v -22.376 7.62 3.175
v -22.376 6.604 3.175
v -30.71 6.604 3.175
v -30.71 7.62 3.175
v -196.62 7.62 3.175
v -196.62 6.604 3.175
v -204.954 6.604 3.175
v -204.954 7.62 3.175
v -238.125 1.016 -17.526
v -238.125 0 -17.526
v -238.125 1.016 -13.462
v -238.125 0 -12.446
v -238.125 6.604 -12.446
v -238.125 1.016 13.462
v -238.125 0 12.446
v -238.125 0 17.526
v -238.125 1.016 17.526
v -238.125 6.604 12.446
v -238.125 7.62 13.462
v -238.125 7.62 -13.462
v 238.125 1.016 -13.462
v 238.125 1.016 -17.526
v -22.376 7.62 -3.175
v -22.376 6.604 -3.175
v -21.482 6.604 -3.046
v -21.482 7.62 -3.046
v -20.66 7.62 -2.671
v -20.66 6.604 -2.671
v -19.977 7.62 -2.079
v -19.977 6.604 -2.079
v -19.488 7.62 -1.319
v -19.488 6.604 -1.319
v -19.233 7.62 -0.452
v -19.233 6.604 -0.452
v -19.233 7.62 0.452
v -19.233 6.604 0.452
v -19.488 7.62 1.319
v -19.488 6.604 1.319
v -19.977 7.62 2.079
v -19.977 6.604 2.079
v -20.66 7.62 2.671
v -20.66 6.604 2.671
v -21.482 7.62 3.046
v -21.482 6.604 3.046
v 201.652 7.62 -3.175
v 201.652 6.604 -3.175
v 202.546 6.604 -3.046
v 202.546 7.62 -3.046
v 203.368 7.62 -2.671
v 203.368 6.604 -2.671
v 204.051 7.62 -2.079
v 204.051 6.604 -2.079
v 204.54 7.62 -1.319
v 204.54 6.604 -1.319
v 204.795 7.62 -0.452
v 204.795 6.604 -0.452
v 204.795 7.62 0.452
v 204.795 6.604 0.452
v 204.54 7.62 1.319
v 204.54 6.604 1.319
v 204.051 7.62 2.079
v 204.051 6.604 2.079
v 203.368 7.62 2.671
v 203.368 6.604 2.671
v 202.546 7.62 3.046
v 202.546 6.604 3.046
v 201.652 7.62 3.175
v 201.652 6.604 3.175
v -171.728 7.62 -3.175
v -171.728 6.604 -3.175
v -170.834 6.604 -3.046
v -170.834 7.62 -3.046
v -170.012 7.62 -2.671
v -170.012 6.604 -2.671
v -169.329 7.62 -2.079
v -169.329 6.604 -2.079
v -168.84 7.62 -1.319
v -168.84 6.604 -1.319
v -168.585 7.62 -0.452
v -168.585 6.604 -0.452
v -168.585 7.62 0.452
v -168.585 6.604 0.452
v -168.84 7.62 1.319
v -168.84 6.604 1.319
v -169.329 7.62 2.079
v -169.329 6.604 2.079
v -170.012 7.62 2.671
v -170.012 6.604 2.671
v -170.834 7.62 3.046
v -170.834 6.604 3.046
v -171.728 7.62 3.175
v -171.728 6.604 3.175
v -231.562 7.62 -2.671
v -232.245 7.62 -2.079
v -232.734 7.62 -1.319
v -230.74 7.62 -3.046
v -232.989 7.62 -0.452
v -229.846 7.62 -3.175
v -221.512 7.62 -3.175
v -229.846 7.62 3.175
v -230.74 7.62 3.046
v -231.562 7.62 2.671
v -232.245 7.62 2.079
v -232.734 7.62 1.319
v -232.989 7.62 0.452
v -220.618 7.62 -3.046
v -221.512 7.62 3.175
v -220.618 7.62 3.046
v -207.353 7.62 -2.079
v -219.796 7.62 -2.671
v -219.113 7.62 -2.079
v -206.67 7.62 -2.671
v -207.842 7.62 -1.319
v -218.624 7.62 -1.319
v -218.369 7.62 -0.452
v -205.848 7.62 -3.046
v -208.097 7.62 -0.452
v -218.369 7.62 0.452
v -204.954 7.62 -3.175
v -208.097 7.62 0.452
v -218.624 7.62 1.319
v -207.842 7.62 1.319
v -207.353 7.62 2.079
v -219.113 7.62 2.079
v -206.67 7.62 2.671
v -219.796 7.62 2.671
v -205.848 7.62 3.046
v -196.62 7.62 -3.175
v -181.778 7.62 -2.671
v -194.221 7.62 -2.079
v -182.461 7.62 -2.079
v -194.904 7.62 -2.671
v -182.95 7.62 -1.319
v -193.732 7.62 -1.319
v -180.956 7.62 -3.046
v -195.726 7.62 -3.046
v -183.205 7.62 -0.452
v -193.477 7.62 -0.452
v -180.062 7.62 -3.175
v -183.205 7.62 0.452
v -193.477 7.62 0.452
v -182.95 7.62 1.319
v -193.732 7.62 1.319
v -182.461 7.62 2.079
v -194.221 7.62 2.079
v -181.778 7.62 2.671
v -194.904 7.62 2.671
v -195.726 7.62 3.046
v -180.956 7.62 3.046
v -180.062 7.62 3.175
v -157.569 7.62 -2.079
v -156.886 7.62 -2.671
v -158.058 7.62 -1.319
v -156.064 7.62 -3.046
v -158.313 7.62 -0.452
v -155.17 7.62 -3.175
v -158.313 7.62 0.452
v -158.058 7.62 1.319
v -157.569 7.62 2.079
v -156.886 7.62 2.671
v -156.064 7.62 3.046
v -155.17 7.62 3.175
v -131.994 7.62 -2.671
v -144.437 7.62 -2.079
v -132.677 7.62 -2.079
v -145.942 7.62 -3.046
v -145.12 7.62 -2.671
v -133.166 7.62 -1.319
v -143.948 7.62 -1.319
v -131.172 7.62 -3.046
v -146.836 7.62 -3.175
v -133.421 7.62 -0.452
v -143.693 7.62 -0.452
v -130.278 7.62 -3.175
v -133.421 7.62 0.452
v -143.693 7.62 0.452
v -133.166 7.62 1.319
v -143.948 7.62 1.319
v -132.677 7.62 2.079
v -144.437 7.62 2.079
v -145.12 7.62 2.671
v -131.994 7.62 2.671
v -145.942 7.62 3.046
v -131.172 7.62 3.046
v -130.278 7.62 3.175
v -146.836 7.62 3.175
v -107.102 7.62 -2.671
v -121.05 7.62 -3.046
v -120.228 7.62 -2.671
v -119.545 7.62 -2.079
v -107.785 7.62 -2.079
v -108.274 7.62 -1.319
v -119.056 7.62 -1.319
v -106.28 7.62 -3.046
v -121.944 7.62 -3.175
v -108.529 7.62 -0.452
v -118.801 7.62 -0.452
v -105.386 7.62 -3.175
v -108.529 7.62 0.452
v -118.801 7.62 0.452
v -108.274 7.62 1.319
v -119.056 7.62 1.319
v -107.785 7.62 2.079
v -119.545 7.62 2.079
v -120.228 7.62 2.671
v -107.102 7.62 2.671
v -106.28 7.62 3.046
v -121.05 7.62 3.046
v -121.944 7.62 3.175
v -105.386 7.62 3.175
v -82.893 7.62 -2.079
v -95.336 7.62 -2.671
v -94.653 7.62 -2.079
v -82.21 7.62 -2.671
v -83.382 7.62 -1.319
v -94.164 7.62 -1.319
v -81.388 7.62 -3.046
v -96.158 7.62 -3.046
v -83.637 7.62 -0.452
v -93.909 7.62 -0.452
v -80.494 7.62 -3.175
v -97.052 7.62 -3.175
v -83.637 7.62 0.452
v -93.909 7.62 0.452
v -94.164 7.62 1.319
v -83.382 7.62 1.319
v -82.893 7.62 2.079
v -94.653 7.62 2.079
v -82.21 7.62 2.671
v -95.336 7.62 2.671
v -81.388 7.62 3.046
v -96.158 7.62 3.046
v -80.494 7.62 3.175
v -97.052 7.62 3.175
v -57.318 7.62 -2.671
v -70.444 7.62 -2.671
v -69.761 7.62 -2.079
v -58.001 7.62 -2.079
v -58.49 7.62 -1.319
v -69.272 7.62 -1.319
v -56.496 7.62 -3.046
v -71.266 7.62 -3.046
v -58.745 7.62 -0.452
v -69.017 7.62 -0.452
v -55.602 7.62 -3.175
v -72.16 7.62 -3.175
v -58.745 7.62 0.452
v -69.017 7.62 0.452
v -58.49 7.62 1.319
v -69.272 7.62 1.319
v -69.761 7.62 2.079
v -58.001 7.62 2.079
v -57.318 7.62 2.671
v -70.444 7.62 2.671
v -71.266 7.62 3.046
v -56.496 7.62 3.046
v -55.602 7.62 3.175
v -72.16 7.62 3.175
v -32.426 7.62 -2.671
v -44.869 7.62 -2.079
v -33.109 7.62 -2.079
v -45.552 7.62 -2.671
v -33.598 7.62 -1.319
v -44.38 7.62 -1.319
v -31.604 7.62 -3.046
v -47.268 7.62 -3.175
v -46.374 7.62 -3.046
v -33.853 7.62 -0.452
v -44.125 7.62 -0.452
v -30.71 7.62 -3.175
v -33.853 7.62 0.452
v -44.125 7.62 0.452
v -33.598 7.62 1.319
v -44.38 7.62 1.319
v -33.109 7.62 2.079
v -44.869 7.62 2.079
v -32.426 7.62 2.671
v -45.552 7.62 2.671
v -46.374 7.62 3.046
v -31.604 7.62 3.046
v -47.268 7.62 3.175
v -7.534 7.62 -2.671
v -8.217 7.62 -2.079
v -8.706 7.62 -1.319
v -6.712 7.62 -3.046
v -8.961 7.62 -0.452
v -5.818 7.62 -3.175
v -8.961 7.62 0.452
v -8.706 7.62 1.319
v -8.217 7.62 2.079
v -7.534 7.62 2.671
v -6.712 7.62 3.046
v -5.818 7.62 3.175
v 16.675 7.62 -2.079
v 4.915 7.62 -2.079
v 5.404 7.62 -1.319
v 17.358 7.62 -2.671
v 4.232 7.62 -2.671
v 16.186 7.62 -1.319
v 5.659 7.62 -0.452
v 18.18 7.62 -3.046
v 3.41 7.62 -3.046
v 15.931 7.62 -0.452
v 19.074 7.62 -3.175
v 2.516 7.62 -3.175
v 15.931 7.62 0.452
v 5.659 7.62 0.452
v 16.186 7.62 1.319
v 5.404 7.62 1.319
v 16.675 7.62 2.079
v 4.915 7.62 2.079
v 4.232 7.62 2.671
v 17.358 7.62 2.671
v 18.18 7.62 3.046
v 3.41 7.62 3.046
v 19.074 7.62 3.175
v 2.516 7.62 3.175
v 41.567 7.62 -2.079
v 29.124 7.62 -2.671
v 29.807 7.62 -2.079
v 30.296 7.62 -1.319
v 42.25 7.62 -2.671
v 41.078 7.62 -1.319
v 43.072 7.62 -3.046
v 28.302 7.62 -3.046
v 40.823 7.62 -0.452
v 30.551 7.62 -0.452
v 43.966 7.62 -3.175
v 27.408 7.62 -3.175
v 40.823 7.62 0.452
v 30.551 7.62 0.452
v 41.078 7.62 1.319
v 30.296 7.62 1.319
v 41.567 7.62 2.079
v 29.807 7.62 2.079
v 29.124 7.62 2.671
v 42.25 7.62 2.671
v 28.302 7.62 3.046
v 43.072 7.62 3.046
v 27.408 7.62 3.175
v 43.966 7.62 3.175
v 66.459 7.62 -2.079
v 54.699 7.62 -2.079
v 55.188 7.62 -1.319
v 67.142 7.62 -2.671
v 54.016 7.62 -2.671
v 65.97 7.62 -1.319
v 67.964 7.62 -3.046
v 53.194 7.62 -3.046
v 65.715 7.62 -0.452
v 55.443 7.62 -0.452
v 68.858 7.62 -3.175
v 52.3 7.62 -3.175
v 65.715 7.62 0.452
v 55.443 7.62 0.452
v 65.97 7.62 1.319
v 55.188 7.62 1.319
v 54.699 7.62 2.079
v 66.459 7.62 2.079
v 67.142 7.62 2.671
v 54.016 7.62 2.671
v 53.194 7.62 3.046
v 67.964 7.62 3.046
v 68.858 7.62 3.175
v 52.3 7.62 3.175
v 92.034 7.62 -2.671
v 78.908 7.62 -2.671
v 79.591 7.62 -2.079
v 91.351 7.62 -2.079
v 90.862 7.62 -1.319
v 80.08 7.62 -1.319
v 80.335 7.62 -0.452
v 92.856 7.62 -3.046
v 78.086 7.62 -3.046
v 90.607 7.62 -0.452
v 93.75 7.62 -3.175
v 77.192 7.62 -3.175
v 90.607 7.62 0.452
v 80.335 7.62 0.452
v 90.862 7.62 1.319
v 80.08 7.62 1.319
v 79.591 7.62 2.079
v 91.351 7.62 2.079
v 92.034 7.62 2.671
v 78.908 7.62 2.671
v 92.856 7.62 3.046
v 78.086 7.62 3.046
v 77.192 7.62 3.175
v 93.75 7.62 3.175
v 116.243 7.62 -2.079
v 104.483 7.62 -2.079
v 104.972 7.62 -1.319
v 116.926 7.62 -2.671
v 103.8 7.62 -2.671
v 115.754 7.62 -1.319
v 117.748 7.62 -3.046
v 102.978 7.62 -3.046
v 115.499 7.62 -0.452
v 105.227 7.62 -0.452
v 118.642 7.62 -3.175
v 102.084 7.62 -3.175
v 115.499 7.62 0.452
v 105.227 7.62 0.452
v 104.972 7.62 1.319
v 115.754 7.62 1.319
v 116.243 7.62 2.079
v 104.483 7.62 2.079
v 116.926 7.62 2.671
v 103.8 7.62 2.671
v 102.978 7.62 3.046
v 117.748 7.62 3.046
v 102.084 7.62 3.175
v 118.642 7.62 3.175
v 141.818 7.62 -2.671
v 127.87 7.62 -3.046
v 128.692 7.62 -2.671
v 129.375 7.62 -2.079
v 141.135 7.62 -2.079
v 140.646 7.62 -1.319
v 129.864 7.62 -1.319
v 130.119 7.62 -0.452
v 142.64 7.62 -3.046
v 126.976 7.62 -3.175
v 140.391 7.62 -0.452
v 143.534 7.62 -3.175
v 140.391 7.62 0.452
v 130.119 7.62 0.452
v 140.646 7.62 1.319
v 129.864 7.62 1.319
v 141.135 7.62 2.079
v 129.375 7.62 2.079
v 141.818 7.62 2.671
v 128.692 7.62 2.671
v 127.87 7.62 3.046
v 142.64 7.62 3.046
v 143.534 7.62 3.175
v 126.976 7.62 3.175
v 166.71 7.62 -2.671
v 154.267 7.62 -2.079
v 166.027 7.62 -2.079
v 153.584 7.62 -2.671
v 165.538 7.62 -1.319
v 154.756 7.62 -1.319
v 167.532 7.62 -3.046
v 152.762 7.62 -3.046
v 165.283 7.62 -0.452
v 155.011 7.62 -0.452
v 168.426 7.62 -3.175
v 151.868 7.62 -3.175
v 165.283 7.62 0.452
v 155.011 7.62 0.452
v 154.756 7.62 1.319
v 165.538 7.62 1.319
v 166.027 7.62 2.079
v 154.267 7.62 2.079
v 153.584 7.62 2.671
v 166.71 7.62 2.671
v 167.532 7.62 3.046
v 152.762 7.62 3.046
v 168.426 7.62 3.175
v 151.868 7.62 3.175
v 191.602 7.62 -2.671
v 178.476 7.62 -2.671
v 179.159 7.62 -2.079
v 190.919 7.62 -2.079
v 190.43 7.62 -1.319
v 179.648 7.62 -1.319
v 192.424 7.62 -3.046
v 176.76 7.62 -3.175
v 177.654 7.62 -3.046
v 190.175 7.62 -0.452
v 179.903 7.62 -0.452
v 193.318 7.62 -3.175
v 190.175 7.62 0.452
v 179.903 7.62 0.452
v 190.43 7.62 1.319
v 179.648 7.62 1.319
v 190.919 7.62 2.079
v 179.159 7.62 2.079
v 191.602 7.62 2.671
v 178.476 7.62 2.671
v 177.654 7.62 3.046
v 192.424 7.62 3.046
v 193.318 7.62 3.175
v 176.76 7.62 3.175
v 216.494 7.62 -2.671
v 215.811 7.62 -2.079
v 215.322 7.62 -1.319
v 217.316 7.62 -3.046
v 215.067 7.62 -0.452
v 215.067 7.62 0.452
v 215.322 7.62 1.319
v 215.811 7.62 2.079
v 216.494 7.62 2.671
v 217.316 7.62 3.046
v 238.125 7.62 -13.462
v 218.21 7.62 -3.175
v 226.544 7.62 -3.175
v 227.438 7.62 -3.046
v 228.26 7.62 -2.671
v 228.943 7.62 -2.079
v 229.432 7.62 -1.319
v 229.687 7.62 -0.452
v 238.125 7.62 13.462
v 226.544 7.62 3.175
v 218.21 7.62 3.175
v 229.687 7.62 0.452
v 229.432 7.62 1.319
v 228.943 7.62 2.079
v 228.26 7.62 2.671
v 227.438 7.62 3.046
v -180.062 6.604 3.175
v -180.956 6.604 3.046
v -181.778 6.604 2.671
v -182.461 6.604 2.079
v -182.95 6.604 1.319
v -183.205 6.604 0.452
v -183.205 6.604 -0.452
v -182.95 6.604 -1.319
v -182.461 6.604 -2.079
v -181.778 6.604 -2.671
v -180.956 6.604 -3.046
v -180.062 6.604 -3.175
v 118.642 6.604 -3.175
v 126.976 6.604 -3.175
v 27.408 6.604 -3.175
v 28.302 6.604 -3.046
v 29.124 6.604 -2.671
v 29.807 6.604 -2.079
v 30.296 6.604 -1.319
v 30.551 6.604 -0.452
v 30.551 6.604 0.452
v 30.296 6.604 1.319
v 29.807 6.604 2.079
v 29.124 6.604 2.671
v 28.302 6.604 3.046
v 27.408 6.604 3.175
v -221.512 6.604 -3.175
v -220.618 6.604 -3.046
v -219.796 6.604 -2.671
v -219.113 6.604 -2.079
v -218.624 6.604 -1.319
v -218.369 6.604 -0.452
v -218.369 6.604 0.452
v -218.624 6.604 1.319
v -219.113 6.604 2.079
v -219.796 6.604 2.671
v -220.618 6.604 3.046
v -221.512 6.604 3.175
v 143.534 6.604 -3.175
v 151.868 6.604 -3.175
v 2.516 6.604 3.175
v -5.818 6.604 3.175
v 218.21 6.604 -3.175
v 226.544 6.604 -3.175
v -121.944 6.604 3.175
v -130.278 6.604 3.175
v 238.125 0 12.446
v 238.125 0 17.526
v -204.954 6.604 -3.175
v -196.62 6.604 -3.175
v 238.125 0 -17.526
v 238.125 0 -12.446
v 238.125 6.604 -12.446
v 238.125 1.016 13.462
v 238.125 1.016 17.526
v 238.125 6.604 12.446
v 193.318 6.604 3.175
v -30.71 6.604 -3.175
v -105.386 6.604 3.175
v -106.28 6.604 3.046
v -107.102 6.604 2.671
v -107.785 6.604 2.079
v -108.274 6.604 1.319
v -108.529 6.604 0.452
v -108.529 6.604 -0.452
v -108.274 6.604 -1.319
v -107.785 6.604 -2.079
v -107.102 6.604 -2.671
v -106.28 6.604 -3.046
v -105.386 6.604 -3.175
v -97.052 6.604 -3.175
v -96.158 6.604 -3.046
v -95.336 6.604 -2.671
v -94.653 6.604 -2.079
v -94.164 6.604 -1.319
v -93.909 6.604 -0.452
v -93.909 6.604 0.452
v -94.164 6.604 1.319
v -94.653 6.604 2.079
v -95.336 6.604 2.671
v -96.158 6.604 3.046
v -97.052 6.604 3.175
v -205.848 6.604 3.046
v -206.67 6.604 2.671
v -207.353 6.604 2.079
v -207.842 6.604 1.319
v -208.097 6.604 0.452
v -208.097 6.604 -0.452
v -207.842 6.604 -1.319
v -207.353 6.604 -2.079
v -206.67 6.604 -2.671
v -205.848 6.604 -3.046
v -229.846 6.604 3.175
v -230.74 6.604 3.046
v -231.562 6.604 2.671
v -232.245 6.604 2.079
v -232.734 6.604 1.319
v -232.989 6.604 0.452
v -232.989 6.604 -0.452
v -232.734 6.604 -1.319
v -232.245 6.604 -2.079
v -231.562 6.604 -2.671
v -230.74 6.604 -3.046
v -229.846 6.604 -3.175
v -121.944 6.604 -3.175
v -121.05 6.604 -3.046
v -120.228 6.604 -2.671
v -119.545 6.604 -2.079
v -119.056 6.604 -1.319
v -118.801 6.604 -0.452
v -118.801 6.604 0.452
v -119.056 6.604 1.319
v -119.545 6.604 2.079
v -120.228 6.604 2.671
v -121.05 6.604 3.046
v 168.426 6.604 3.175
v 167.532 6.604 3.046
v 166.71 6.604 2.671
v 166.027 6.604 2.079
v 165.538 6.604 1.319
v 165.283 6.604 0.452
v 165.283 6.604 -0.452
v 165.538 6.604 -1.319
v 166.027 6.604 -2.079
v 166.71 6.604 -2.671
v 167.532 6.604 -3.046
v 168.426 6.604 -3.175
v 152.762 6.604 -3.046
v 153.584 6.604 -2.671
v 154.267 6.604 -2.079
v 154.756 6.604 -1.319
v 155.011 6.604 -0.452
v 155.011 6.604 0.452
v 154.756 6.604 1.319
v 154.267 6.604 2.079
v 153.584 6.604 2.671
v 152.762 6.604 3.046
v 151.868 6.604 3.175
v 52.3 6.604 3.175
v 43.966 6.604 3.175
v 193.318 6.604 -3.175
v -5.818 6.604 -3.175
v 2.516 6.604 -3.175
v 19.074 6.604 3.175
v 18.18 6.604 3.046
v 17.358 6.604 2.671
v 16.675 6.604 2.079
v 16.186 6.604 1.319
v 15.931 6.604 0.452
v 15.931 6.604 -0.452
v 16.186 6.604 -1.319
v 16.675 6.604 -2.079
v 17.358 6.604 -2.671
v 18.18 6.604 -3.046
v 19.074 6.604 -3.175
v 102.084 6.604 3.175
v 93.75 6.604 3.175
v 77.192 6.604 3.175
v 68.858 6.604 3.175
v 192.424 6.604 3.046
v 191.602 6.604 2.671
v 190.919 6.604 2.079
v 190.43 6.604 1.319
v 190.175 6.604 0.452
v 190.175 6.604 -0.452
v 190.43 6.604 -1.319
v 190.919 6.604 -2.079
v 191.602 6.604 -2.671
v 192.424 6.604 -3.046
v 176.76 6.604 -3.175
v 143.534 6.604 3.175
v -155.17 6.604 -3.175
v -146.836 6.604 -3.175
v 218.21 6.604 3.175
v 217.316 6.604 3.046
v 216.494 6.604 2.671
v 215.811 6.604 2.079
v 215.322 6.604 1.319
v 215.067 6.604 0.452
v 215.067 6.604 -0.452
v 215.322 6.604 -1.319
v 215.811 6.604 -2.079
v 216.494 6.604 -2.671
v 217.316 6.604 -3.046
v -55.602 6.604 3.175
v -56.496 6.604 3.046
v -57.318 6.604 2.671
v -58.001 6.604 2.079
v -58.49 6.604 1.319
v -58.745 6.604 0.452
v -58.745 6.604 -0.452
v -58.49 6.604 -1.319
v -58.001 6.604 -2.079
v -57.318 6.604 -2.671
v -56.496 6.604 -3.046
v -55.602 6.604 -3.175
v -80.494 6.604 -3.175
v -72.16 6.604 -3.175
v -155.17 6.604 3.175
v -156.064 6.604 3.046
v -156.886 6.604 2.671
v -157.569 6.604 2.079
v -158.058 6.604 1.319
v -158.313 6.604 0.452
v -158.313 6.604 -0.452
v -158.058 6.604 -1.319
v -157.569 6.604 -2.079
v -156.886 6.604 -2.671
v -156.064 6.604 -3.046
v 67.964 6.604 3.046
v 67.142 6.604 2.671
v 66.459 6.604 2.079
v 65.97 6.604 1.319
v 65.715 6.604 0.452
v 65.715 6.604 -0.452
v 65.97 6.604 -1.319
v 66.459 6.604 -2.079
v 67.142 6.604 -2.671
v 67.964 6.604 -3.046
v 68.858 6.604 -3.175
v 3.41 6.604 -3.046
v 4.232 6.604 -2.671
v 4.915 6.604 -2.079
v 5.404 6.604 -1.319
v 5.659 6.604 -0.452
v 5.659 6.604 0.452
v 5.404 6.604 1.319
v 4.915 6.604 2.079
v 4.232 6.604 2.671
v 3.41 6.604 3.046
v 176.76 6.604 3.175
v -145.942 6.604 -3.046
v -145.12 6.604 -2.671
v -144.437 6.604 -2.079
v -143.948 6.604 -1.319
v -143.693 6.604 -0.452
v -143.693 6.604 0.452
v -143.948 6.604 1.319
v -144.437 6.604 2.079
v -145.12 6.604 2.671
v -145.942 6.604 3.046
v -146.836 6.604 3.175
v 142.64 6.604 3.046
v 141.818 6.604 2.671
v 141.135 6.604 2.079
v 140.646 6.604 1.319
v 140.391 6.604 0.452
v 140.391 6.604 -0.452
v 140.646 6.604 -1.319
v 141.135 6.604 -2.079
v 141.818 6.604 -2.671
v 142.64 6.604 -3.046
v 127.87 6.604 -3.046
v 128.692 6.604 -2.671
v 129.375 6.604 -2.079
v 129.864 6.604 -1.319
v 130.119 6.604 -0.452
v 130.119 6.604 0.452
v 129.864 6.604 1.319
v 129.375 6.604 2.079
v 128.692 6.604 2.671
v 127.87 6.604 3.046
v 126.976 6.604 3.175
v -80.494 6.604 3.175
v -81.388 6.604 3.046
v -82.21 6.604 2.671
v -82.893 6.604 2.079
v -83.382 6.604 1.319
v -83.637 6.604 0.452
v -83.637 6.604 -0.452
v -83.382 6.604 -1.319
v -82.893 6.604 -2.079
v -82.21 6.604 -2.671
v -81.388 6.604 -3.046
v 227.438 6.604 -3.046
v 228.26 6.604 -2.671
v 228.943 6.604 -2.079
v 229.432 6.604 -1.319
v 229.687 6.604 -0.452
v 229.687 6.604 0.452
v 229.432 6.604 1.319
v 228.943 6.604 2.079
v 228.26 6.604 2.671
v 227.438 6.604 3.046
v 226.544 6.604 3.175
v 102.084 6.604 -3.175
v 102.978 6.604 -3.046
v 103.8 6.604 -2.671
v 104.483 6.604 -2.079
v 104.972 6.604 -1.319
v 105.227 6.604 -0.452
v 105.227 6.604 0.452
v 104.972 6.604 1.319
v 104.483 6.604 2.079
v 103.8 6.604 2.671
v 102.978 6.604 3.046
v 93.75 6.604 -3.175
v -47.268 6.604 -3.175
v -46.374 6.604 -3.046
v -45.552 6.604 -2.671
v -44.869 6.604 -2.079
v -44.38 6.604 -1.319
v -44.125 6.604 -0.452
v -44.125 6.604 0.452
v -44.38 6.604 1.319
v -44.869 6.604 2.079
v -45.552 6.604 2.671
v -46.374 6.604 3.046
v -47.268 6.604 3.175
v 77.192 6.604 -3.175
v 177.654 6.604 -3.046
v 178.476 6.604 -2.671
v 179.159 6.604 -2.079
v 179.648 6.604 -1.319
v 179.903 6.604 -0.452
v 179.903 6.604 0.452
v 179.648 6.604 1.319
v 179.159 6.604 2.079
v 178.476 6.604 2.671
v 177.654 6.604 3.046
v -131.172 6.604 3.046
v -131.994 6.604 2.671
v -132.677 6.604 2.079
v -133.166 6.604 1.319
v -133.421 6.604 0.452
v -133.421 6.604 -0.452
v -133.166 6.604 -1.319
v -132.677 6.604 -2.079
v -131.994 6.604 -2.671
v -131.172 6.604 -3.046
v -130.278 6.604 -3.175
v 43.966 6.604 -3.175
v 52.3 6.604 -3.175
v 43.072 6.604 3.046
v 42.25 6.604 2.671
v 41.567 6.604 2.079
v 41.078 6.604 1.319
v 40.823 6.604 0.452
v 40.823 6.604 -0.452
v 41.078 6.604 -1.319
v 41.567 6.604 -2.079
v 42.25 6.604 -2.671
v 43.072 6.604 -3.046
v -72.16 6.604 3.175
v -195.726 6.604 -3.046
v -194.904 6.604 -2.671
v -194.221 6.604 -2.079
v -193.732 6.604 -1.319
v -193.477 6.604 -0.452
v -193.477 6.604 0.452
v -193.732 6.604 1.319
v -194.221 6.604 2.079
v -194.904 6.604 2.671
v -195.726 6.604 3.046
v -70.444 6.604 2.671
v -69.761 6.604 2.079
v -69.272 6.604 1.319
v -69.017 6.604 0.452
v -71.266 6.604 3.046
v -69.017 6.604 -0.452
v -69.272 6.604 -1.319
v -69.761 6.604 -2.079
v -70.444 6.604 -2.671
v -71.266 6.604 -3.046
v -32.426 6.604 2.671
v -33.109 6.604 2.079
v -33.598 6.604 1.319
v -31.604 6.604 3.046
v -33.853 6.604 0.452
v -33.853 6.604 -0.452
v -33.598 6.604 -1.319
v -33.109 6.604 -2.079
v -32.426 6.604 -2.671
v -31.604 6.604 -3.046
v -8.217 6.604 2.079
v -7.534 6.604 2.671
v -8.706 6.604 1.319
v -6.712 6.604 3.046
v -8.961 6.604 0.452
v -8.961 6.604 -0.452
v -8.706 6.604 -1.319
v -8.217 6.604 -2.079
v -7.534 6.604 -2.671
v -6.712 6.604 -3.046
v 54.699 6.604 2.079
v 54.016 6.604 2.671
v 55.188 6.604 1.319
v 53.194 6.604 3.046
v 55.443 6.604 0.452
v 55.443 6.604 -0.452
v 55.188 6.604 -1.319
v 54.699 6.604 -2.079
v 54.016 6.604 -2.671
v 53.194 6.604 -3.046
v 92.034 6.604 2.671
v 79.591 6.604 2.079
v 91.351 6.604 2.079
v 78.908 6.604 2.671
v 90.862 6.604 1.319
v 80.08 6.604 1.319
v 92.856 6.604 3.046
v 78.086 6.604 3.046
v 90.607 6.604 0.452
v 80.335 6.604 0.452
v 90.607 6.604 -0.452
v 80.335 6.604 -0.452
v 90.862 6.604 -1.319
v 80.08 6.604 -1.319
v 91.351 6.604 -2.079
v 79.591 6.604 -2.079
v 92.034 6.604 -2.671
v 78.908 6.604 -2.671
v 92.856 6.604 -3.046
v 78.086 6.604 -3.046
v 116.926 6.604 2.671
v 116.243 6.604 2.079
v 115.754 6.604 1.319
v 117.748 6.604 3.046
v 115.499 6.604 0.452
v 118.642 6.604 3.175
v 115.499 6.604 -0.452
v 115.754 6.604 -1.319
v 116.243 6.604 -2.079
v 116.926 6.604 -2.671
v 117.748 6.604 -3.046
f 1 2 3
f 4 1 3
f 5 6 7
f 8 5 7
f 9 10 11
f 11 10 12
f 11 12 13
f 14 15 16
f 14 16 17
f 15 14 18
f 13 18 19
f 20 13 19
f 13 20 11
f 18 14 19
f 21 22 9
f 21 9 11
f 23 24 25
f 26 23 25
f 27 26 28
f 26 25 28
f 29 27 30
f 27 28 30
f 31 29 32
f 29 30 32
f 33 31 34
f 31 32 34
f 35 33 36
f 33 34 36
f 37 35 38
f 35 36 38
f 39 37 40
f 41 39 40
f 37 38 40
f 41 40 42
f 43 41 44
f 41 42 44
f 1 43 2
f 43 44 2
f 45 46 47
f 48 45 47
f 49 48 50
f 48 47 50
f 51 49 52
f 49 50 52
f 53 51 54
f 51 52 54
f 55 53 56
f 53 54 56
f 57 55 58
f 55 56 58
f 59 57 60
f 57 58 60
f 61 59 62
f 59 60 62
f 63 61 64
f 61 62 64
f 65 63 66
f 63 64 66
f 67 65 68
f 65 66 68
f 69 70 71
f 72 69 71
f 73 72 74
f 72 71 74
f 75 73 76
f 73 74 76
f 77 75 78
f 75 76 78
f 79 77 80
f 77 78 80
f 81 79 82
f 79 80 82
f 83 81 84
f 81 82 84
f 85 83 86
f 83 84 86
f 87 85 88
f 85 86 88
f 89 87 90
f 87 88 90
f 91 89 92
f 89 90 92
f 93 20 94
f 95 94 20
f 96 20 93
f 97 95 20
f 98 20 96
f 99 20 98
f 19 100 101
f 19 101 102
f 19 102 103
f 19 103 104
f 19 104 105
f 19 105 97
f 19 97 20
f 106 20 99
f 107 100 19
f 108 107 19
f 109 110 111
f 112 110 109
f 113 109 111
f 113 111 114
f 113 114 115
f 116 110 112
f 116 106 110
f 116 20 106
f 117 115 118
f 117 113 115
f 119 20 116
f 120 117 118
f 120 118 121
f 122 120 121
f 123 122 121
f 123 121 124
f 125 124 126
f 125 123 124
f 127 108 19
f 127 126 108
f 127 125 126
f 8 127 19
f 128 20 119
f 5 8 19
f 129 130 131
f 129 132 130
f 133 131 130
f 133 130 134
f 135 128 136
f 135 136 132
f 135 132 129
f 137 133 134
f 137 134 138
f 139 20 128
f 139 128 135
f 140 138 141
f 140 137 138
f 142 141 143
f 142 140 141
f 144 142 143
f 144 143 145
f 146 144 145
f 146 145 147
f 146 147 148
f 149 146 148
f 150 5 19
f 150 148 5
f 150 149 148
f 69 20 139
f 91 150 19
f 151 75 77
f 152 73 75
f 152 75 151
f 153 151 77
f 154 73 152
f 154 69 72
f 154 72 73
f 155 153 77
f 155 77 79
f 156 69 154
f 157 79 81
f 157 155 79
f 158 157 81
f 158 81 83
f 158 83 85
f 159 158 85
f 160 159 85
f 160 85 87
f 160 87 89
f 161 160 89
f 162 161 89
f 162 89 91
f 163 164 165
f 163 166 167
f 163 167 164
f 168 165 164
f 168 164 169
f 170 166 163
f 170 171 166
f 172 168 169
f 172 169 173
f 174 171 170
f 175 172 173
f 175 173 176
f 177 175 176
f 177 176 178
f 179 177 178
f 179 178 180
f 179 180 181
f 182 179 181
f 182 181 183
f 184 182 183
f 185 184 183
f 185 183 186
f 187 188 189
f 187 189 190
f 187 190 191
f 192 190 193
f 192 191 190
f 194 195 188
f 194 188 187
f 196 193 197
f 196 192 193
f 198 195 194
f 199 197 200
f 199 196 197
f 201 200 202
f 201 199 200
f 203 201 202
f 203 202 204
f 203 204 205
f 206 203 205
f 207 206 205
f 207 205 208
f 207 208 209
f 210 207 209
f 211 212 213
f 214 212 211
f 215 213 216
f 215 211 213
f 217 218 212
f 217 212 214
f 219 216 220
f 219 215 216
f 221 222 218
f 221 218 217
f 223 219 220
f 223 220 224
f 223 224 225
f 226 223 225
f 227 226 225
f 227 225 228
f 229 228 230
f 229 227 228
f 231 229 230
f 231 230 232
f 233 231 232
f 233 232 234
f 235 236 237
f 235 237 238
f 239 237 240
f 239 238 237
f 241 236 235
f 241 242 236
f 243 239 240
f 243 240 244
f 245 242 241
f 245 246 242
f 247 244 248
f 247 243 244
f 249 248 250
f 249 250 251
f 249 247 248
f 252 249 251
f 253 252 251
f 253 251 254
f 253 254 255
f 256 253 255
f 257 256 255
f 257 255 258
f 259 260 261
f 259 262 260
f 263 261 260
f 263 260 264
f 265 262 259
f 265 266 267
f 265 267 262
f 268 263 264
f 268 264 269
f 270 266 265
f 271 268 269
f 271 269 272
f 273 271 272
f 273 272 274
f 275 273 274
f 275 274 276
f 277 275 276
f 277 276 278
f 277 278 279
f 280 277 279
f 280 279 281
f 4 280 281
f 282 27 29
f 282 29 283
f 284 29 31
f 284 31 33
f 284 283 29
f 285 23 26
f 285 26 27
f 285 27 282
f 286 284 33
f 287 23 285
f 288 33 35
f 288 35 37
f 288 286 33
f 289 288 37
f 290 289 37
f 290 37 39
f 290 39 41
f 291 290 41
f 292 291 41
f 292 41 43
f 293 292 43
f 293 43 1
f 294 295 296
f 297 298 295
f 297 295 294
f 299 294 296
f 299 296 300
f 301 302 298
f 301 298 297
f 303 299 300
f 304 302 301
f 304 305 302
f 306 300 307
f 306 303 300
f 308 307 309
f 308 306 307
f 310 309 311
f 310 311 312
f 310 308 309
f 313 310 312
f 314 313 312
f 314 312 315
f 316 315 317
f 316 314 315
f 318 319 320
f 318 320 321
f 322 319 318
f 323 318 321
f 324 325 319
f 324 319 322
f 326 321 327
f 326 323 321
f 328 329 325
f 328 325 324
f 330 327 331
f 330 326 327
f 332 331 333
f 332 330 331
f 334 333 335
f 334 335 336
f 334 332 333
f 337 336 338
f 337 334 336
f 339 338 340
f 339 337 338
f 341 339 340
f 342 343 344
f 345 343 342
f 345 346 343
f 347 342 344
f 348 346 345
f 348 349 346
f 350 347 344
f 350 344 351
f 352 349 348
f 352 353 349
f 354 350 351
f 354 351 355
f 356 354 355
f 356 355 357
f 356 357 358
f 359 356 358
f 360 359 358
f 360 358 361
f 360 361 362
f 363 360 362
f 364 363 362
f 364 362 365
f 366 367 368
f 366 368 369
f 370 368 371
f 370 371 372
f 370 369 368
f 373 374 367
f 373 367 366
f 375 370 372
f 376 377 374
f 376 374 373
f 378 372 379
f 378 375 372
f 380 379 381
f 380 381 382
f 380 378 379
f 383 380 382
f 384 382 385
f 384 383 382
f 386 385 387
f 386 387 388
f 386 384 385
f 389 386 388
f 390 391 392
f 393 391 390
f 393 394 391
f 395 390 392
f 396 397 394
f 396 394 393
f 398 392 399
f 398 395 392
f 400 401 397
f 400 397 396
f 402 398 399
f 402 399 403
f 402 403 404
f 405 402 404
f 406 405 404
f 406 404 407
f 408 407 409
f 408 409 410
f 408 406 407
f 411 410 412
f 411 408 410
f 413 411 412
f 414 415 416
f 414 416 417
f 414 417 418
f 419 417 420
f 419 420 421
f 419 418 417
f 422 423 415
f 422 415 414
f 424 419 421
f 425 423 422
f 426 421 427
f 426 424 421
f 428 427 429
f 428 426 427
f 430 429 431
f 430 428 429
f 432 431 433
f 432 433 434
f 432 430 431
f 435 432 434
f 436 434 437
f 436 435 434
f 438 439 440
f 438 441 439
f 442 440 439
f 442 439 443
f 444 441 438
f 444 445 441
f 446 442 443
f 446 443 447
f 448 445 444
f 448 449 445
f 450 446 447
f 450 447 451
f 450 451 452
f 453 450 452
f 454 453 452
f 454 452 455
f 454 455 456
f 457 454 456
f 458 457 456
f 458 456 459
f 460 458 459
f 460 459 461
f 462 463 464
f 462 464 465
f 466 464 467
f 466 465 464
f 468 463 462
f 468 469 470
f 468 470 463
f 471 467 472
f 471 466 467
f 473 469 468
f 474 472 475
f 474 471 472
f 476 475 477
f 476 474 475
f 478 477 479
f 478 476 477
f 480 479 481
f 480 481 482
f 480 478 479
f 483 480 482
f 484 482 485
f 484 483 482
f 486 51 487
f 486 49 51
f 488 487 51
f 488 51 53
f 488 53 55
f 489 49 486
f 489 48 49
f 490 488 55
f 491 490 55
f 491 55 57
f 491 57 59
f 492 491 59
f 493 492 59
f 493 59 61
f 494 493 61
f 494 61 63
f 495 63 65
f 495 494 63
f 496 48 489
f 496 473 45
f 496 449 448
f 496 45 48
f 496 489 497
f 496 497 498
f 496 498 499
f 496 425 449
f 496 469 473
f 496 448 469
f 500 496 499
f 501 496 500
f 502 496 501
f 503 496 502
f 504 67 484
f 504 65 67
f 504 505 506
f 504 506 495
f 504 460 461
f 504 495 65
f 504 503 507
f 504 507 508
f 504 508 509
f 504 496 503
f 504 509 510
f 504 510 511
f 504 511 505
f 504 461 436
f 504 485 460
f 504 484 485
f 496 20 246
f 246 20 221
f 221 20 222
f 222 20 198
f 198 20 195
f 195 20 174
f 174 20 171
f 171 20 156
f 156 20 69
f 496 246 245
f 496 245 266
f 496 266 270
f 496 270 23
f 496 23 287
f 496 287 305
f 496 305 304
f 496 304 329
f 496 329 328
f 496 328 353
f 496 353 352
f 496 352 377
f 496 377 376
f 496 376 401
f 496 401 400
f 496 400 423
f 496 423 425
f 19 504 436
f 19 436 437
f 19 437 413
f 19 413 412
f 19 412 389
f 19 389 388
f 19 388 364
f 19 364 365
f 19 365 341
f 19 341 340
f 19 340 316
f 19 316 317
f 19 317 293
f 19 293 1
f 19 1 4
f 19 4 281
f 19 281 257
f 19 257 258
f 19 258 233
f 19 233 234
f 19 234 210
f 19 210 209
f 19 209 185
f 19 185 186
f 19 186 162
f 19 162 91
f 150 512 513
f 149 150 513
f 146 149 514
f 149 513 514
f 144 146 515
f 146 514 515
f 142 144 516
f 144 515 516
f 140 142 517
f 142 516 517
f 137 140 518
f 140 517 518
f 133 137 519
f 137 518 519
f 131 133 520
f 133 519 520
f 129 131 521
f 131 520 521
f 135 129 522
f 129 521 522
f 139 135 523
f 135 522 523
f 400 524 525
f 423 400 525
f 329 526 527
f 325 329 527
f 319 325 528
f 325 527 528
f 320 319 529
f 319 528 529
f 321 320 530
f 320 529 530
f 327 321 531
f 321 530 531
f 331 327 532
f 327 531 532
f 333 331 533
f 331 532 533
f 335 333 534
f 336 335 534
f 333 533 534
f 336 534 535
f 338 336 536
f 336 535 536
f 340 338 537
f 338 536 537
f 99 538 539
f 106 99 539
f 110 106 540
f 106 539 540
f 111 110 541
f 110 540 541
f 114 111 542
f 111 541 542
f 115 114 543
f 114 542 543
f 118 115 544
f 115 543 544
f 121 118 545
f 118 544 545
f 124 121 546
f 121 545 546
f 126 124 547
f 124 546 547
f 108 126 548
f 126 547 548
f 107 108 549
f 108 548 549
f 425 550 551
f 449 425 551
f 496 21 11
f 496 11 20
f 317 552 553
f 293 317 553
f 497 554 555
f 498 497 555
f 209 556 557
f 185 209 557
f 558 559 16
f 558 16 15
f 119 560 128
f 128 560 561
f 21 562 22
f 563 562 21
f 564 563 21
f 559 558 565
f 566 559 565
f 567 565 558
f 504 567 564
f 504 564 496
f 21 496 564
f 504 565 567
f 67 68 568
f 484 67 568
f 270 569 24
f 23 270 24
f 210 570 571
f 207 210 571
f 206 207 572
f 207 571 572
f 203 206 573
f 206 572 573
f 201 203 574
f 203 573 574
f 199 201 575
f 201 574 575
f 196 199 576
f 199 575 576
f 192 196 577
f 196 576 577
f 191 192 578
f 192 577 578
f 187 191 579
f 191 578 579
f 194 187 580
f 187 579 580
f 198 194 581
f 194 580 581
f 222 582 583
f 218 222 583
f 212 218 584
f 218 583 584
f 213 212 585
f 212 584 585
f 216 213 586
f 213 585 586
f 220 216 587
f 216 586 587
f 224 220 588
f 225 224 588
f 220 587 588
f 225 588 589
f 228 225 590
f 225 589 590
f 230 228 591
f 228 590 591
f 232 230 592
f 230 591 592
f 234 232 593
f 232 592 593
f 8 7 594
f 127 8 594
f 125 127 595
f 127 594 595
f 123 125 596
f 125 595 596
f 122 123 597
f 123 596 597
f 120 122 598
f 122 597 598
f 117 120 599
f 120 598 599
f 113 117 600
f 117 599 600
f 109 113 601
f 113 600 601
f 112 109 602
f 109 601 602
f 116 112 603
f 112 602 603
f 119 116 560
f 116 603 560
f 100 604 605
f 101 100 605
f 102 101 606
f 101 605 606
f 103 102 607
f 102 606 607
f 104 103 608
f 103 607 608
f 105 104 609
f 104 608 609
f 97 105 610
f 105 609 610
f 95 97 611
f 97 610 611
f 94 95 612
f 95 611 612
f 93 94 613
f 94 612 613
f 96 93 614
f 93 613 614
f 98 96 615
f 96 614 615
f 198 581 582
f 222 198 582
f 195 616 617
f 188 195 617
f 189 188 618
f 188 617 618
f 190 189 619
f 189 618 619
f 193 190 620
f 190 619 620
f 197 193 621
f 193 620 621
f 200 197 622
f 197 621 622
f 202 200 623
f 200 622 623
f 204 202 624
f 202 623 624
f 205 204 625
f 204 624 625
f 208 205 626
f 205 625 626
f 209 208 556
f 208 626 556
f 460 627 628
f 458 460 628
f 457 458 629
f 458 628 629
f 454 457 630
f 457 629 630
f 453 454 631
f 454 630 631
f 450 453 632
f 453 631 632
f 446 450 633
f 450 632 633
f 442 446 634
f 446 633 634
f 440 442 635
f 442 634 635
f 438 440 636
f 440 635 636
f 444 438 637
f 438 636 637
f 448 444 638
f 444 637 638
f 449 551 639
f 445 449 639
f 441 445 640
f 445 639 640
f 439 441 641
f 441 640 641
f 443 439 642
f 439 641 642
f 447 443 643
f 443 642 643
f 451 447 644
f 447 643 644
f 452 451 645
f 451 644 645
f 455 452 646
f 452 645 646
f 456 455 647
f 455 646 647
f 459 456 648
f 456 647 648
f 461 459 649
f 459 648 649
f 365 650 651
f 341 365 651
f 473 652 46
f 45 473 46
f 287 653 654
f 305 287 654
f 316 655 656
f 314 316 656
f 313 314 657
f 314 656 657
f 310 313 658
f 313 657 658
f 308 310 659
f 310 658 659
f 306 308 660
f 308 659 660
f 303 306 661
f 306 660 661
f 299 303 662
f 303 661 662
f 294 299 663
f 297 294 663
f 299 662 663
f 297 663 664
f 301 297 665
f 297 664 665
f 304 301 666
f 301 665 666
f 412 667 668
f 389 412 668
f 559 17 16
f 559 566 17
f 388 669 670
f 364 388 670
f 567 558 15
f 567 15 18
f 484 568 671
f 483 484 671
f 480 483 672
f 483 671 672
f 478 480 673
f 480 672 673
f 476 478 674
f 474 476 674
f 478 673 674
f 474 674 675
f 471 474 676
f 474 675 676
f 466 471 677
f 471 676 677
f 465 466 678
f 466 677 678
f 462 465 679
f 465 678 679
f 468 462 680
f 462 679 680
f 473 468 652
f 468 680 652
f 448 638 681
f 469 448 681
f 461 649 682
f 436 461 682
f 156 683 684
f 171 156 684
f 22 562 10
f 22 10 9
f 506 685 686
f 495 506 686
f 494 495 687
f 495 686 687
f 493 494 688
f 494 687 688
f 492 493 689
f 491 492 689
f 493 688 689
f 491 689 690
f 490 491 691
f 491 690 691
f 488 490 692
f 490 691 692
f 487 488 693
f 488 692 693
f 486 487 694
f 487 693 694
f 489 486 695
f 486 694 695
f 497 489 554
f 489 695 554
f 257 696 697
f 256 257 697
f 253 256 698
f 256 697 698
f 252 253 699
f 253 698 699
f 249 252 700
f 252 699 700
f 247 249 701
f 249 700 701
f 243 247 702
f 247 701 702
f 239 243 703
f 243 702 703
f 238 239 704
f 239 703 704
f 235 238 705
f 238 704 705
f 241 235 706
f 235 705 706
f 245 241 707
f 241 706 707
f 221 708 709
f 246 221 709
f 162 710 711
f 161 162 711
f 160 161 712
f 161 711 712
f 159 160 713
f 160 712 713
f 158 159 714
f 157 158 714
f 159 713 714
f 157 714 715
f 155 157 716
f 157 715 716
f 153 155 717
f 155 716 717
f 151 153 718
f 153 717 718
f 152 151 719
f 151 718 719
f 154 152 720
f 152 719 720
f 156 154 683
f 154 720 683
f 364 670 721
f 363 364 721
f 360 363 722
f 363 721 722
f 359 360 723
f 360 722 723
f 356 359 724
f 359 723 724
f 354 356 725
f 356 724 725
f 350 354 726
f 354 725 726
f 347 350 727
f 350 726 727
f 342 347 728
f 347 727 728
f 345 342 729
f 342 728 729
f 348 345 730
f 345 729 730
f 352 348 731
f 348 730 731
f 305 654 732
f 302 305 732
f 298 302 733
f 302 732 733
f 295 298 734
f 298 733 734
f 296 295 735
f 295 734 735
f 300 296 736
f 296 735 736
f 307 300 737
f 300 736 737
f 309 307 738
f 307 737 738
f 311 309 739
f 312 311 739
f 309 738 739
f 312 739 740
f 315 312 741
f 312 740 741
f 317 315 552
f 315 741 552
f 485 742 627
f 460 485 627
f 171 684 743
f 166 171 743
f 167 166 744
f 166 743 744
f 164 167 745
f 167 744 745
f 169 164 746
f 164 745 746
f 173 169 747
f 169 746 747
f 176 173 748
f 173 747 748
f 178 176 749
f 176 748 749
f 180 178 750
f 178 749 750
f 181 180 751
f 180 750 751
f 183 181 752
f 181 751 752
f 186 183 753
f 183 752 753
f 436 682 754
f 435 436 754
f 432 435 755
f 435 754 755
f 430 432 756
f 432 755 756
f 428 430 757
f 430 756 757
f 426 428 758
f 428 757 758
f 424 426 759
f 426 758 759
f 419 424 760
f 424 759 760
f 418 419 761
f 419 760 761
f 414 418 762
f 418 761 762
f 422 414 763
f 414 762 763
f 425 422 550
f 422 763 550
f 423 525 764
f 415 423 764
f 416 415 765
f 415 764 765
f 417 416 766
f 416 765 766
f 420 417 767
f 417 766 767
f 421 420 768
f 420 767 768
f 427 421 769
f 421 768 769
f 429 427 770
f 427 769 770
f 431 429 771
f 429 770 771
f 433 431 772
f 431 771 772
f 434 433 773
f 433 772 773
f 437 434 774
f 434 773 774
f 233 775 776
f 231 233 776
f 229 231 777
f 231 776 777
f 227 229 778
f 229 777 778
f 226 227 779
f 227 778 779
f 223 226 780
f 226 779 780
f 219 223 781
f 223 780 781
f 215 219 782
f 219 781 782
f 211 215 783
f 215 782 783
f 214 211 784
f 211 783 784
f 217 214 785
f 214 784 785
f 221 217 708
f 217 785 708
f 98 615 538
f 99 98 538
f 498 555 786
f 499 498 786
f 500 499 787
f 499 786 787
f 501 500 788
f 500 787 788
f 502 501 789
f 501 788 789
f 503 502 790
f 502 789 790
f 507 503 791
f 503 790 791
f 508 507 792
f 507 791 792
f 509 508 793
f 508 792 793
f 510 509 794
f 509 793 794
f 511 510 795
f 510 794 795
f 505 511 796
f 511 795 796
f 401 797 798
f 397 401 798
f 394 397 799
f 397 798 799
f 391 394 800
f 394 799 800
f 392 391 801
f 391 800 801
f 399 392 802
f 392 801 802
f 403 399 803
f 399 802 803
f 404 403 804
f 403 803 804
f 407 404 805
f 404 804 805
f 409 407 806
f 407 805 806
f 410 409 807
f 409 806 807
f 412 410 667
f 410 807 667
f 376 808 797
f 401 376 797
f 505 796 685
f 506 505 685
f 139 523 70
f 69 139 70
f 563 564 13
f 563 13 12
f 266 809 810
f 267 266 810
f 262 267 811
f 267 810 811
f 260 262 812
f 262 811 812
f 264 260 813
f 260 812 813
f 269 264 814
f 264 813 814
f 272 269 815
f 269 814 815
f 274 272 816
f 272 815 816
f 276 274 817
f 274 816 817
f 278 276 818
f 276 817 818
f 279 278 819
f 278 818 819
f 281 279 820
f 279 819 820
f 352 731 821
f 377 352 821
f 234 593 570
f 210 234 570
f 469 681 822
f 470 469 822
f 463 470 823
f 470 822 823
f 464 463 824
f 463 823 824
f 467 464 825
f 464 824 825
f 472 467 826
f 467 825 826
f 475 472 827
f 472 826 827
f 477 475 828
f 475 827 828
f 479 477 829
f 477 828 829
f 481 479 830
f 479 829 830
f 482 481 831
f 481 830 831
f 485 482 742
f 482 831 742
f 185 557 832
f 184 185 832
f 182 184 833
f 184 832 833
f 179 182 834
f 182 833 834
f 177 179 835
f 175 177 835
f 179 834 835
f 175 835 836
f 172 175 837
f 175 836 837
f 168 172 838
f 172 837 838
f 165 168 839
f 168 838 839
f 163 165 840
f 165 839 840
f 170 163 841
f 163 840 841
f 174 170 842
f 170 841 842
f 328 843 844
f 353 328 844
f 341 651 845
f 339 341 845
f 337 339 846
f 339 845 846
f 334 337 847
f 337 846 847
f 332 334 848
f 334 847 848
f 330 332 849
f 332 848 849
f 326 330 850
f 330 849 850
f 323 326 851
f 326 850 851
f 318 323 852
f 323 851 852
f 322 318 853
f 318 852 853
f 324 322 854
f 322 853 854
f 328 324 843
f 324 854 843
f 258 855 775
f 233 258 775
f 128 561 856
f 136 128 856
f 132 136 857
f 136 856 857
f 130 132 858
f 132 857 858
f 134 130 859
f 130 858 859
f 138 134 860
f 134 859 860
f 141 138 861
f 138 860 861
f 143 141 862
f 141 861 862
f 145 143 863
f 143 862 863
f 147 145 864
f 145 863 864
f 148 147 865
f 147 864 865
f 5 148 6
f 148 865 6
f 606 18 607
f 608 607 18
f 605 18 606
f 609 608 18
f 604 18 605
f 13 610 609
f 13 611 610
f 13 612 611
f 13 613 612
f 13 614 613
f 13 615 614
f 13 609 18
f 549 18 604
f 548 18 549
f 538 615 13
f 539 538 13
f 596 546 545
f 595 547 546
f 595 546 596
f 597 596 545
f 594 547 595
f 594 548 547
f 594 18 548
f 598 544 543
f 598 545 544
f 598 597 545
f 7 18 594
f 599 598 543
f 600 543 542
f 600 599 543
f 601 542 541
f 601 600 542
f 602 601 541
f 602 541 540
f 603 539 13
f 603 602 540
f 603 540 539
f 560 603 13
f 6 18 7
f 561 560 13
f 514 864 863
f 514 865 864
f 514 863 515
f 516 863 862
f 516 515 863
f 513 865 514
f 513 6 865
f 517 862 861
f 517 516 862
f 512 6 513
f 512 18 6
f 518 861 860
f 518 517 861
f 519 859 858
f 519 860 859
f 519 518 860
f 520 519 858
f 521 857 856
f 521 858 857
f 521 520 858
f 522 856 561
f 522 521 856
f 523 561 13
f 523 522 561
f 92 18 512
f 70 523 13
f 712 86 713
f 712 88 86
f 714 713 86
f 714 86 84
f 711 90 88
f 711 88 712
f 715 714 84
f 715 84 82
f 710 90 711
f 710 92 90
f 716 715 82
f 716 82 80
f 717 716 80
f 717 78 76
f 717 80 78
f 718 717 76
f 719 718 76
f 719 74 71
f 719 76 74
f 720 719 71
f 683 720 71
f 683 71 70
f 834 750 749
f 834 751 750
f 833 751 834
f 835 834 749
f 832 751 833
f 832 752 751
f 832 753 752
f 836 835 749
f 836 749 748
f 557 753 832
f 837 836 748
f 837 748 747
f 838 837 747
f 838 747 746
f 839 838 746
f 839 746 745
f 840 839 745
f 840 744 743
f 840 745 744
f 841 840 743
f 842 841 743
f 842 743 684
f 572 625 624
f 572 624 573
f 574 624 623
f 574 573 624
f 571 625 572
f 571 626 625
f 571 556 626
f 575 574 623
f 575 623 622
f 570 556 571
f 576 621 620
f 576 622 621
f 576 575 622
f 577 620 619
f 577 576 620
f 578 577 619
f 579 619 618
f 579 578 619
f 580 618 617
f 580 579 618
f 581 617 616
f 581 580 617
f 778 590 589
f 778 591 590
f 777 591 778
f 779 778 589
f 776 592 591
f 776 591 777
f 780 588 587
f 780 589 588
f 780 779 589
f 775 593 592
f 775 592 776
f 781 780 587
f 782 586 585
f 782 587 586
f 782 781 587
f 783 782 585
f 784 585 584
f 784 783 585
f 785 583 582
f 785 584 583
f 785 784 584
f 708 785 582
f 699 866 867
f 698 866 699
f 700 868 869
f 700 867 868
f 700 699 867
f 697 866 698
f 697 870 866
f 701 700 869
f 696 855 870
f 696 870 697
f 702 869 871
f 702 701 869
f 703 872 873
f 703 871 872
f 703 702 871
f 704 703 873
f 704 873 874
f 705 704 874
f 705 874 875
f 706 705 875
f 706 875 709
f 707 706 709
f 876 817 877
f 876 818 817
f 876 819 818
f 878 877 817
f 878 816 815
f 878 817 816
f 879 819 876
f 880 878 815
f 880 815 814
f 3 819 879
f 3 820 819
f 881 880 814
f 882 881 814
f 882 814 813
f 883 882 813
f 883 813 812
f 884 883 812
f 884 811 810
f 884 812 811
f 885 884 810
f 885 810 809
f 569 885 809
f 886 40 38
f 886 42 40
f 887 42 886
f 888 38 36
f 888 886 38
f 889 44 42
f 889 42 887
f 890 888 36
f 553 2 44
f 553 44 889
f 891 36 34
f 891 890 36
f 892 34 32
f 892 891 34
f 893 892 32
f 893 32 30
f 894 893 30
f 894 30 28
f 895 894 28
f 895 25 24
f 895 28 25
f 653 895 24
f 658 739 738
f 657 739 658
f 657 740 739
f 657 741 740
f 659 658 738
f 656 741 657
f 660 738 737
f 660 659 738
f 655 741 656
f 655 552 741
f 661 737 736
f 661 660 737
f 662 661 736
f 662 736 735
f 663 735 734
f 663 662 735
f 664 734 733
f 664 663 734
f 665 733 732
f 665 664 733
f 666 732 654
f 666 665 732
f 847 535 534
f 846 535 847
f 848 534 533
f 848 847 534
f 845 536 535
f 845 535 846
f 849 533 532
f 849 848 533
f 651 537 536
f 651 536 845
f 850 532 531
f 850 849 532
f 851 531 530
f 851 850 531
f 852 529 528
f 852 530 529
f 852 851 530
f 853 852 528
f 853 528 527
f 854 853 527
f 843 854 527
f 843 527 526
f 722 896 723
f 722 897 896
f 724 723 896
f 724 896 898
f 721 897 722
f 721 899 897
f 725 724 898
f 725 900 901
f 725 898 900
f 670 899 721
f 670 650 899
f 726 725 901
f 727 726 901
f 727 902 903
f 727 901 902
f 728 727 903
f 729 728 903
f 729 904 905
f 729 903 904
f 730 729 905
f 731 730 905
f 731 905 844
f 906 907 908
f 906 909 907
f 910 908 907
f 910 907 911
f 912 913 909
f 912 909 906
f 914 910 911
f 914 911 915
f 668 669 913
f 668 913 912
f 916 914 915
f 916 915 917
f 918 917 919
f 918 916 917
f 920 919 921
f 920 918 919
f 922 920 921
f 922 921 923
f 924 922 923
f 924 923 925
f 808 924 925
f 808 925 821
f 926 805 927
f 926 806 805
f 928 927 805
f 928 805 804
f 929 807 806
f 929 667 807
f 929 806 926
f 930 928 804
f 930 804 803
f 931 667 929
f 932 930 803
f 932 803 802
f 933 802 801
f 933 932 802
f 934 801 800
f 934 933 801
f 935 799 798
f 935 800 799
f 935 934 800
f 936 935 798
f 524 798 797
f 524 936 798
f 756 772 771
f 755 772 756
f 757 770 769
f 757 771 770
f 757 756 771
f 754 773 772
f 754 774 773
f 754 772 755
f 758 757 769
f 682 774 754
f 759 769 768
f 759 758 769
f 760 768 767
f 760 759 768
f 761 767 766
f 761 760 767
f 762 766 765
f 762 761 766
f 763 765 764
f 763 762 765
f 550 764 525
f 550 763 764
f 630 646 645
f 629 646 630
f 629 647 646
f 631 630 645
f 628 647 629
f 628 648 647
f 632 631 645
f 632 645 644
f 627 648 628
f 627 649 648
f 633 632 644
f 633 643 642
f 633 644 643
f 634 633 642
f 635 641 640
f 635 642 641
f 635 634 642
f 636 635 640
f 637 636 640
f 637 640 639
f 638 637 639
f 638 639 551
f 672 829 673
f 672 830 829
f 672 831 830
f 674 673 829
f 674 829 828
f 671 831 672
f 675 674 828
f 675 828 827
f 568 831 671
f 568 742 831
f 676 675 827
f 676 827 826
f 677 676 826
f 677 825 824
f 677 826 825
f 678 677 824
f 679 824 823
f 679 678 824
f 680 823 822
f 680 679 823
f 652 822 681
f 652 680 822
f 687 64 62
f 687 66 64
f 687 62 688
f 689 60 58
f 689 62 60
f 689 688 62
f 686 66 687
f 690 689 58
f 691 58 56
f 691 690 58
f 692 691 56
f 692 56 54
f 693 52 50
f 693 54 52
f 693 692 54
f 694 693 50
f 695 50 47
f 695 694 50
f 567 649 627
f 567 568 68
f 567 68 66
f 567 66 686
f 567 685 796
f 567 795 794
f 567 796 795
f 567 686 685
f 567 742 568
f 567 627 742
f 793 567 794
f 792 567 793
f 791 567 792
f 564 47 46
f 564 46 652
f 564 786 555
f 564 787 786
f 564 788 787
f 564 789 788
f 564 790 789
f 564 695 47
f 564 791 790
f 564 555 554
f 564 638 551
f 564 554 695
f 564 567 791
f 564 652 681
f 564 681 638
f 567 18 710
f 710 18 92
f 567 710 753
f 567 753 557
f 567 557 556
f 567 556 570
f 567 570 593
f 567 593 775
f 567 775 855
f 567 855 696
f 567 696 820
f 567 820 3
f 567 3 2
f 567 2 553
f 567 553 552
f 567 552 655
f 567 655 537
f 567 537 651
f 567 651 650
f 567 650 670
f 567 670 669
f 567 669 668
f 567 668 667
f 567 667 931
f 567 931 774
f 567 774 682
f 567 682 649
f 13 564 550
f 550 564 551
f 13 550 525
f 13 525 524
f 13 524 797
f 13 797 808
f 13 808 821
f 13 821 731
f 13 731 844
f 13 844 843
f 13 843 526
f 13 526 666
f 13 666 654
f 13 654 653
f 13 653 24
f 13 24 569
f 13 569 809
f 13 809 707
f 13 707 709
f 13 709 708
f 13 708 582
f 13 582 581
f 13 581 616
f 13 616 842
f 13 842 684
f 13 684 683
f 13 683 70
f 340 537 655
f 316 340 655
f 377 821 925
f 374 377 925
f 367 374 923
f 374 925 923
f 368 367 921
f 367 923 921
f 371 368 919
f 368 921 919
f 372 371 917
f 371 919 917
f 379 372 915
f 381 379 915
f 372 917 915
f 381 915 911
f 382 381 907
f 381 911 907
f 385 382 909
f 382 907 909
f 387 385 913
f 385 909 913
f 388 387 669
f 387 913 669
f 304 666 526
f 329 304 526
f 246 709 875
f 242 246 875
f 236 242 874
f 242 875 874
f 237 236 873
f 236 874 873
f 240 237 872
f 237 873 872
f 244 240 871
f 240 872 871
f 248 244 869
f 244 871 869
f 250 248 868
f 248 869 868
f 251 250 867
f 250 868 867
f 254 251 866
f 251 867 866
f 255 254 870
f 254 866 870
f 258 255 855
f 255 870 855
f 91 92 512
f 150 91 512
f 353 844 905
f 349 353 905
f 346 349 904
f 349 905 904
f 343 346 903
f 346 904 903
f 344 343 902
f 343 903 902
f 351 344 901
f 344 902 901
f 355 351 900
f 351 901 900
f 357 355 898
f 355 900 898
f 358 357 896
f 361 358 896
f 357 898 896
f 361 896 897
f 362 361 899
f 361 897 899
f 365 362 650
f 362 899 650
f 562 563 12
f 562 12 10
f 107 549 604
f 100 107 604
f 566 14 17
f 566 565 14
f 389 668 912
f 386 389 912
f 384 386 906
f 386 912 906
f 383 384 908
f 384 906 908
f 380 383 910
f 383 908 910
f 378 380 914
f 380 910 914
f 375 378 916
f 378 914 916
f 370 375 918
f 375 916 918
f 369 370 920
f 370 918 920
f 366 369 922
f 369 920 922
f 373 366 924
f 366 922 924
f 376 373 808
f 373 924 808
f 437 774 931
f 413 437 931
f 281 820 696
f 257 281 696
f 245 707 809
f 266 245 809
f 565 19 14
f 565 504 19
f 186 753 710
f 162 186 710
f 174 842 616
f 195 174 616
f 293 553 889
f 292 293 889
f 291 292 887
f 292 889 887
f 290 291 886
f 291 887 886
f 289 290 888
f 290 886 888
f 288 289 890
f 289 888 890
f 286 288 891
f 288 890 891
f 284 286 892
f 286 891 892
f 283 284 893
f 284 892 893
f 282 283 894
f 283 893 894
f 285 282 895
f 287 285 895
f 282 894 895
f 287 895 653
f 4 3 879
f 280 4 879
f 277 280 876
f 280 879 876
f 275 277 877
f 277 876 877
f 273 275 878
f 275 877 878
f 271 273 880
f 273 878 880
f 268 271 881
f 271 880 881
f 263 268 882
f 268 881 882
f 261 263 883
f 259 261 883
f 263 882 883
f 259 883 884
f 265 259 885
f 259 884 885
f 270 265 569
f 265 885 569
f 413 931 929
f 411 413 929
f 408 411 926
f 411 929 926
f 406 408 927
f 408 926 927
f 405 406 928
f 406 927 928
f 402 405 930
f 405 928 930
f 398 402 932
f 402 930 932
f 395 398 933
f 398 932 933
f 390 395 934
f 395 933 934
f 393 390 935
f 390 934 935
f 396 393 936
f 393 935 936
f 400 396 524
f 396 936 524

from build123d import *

# Parameters (mm, degrees)
F1_DEPTH = 238.125
F3_DEPTH = 1.017


with BuildPart() as f1:
    # F0 (on Right) → F1 (new body, symmetric)
    with BuildSketch(Plane.YZ):
        Polygon((1.016, 17.526), (0, 17.526), (0, 12.446), (6.604, 12.446), (6.604, -12.446), (0, -12.446), (0, -17.526), (1.016, -17.526), (1.016, -13.462), (7.62, -13.462), (7.62, 13.462), (1.016, 13.462), align=None)
    extrude(amount=F1_DEPTH, both=True)

    # F2 (on face) → F3 (cut, through all)
    with BuildSketch(Plane.XZ.offset(-6.604)):
        with BuildLine():
            Line((-196.62013, 3.175), (-204.95387, 3.175))
            ThreePointArc((-204.95387, 3.175), (-208.12887, 0), (-204.95387, -3.175))
            Line((-204.95387, -3.175), (-196.62013, -3.175))
            ThreePointArc((-196.62013, -3.175), (-193.44513, 0), (-196.62013, 3.175))
        make_face()
        with BuildLine():
            ThreePointArc((-229.84587, 3.175), (-233.02087, 0), (-229.84587, -3.175))
            Line((-229.84587, -3.175), (-221.51213, -3.175))
            ThreePointArc((-221.51213, -3.175), (-218.33713, 0), (-221.51213, 3.175))
            Line((-221.51213, 3.175), (-229.84587, 3.175))
        make_face()
        with BuildLine():
            Line((-171.72813, 3.175), (-180.06187, 3.175))
            ThreePointArc((-180.06187, 3.175), (-183.23687, 0), (-180.06187, -3.175))
            Line((-180.06187, -3.175), (-171.72813, -3.175))
            ThreePointArc((-171.72813, -3.175), (-168.55313, 0), (-171.72813, 3.175))
        make_face()
        with BuildLine():
            Line((-146.83613, 3.175), (-155.16987, 3.175))
            ThreePointArc((-155.16987, 3.175), (-158.34487, 0), (-155.16987, -3.175))
            Line((-155.16987, -3.175), (-146.83613, -3.175))
            ThreePointArc((-146.83613, -3.175), (-143.66113, 0), (-146.83613, 3.175))
        make_face()
        with BuildLine():
            Line((-121.94413, 3.175), (-130.27787, 3.175))
            ThreePointArc((-130.27787, 3.175), (-133.45287, 0), (-130.27787, -3.175))
            Line((-130.27787, -3.175), (-121.94413, -3.175))
            ThreePointArc((-121.94413, -3.175), (-118.76913, 0), (-121.94413, 3.175))
        make_face()
        with BuildLine():
            Line((-97.05213, 3.175), (-105.38587, 3.175))
            ThreePointArc((-105.38587, 3.175), (-108.56087, 0), (-105.38587, -3.175))
            Line((-105.38587, -3.175), (-97.05213, -3.175))
            ThreePointArc((-97.05213, -3.175), (-93.87713, 0), (-97.05213, 3.175))
        make_face()
        with BuildLine():
            Line((-72.16013, 3.175), (-80.49387, 3.175))
            ThreePointArc((-80.49387, 3.175), (-83.66887, 0), (-80.49387, -3.175))
            Line((-80.49387, -3.175), (-72.16013, -3.175))
            ThreePointArc((-72.16013, -3.175), (-68.98513, 0), (-72.16013, 3.175))
        make_face()
        with BuildLine():
            Line((-47.26813, 3.175), (-55.60187, 3.175))
            ThreePointArc((-55.60187, 3.175), (-58.77687, 0), (-55.60187, -3.175))
            Line((-55.60187, -3.175), (-47.26813, -3.175))
            ThreePointArc((-47.26813, -3.175), (-44.09313, 0), (-47.26813, 3.175))
        make_face()
        with BuildLine():
            Line((-22.37613, 3.175), (-30.70987, 3.175))
            ThreePointArc((-30.70987, 3.175), (-33.88487, 0), (-30.70987, -3.175))
            Line((-30.70987, -3.175), (-22.37613, -3.175))
            ThreePointArc((-22.37613, -3.175), (-19.20113, 0), (-22.37613, 3.175))
        make_face()
        with BuildLine():
            Line((2.51587, 3.175), (-5.81787, 3.175))
            ThreePointArc((-5.81787, 3.175), (-8.99287, 0), (-5.81787, -3.175))
            Line((-5.81787, -3.175), (2.51587, -3.175))
            ThreePointArc((2.51587, -3.175), (5.69087, 0), (2.51587, 3.175))
        make_face()
        with BuildLine():
            Line((27.40787, 3.175), (19.07413, 3.175))
            ThreePointArc((19.07413, 3.175), (15.89913, 0), (19.07413, -3.175))
            Line((19.07413, -3.175), (27.40787, -3.175))
            ThreePointArc((27.40787, -3.175), (30.58287, 0), (27.40787, 3.175))
        make_face()
        with BuildLine():
            Line((52.29987, 3.175), (43.96613, 3.175))
            ThreePointArc((43.96613, 3.175), (40.79113, 0), (43.96613, -3.175))
            Line((43.96613, -3.175), (52.29987, -3.175))
            ThreePointArc((52.29987, -3.175), (55.47487, 0), (52.29987, 3.175))
        make_face()
        with BuildLine():
            Line((77.19187, 3.175), (68.85813, 3.175))
            ThreePointArc((68.85813, 3.175), (65.68313, 0), (68.85813, -3.175))
            Line((68.85813, -3.175), (77.19187, -3.175))
            ThreePointArc((77.19187, -3.175), (80.36687, 0), (77.19187, 3.175))
        make_face()
        with BuildLine():
            Line((102.08387, 3.175), (93.75013, 3.175))
            ThreePointArc((93.75013, 3.175), (90.57513, 0), (93.75013, -3.175))
            Line((93.75013, -3.175), (102.08387, -3.175))
            ThreePointArc((102.08387, -3.175), (105.25887, 0), (102.08387, 3.175))
        make_face()
        with BuildLine():
            Line((126.97587, 3.175), (118.64213, 3.175))
            ThreePointArc((118.64213, 3.175), (115.46713, 0), (118.64213, -3.175))
            Line((118.64213, -3.175), (126.97587, -3.175))
            ThreePointArc((126.97587, -3.175), (130.15087, 0), (126.97587, 3.175))
        make_face()
        with BuildLine():
            Line((151.86787, 3.175), (143.53413, 3.175))
            ThreePointArc((143.53413, 3.175), (140.35913, 0), (143.53413, -3.175))
            Line((143.53413, -3.175), (151.86787, -3.175))
            ThreePointArc((151.86787, -3.175), (155.04287, 0), (151.86787, 3.175))
        make_face()
        with BuildLine():
            Line((176.75987, 3.175), (168.42613, 3.175))
            ThreePointArc((168.42613, 3.175), (165.25113, 0), (168.42613, -3.175))
            Line((168.42613, -3.175), (176.75987, -3.175))
            ThreePointArc((176.75987, -3.175), (179.93487, 0), (176.75987, 3.175))
        make_face()
        with BuildLine():
            Line((201.65187, 3.175), (193.31813, 3.175))
            ThreePointArc((193.31813, 3.175), (190.14313, 0), (193.31813, -3.175))
            Line((193.31813, -3.175), (201.65187, -3.175))
            ThreePointArc((201.65187, -3.175), (204.82687, 0), (201.65187, 3.175))
        make_face()
        with BuildLine():
            Line((226.54387, 3.175), (218.21013, 3.175))
            ThreePointArc((218.21013, 3.175), (215.03513, 0), (218.21013, -3.175))
            Line((218.21013, -3.175), (226.54387, -3.175))
            ThreePointArc((226.54387, -3.175), (229.71887, 0), (226.54387, 3.175))
        make_face()
        with BuildLine():
            Line((251.43587, 3.175), (243.10213, 3.175))
            ThreePointArc((243.10213, 3.175), (239.92713, 0), (243.10213, -3.175))
            Line((243.10213, -3.175), (251.43587, -3.175))
            ThreePointArc((251.43587, -3.175), (254.61087, 0), (251.43587, 3.175))
        make_face()
    extrude(amount=-F3_DEPTH, mode=Mode.SUBTRACT)


solid = f1.part
